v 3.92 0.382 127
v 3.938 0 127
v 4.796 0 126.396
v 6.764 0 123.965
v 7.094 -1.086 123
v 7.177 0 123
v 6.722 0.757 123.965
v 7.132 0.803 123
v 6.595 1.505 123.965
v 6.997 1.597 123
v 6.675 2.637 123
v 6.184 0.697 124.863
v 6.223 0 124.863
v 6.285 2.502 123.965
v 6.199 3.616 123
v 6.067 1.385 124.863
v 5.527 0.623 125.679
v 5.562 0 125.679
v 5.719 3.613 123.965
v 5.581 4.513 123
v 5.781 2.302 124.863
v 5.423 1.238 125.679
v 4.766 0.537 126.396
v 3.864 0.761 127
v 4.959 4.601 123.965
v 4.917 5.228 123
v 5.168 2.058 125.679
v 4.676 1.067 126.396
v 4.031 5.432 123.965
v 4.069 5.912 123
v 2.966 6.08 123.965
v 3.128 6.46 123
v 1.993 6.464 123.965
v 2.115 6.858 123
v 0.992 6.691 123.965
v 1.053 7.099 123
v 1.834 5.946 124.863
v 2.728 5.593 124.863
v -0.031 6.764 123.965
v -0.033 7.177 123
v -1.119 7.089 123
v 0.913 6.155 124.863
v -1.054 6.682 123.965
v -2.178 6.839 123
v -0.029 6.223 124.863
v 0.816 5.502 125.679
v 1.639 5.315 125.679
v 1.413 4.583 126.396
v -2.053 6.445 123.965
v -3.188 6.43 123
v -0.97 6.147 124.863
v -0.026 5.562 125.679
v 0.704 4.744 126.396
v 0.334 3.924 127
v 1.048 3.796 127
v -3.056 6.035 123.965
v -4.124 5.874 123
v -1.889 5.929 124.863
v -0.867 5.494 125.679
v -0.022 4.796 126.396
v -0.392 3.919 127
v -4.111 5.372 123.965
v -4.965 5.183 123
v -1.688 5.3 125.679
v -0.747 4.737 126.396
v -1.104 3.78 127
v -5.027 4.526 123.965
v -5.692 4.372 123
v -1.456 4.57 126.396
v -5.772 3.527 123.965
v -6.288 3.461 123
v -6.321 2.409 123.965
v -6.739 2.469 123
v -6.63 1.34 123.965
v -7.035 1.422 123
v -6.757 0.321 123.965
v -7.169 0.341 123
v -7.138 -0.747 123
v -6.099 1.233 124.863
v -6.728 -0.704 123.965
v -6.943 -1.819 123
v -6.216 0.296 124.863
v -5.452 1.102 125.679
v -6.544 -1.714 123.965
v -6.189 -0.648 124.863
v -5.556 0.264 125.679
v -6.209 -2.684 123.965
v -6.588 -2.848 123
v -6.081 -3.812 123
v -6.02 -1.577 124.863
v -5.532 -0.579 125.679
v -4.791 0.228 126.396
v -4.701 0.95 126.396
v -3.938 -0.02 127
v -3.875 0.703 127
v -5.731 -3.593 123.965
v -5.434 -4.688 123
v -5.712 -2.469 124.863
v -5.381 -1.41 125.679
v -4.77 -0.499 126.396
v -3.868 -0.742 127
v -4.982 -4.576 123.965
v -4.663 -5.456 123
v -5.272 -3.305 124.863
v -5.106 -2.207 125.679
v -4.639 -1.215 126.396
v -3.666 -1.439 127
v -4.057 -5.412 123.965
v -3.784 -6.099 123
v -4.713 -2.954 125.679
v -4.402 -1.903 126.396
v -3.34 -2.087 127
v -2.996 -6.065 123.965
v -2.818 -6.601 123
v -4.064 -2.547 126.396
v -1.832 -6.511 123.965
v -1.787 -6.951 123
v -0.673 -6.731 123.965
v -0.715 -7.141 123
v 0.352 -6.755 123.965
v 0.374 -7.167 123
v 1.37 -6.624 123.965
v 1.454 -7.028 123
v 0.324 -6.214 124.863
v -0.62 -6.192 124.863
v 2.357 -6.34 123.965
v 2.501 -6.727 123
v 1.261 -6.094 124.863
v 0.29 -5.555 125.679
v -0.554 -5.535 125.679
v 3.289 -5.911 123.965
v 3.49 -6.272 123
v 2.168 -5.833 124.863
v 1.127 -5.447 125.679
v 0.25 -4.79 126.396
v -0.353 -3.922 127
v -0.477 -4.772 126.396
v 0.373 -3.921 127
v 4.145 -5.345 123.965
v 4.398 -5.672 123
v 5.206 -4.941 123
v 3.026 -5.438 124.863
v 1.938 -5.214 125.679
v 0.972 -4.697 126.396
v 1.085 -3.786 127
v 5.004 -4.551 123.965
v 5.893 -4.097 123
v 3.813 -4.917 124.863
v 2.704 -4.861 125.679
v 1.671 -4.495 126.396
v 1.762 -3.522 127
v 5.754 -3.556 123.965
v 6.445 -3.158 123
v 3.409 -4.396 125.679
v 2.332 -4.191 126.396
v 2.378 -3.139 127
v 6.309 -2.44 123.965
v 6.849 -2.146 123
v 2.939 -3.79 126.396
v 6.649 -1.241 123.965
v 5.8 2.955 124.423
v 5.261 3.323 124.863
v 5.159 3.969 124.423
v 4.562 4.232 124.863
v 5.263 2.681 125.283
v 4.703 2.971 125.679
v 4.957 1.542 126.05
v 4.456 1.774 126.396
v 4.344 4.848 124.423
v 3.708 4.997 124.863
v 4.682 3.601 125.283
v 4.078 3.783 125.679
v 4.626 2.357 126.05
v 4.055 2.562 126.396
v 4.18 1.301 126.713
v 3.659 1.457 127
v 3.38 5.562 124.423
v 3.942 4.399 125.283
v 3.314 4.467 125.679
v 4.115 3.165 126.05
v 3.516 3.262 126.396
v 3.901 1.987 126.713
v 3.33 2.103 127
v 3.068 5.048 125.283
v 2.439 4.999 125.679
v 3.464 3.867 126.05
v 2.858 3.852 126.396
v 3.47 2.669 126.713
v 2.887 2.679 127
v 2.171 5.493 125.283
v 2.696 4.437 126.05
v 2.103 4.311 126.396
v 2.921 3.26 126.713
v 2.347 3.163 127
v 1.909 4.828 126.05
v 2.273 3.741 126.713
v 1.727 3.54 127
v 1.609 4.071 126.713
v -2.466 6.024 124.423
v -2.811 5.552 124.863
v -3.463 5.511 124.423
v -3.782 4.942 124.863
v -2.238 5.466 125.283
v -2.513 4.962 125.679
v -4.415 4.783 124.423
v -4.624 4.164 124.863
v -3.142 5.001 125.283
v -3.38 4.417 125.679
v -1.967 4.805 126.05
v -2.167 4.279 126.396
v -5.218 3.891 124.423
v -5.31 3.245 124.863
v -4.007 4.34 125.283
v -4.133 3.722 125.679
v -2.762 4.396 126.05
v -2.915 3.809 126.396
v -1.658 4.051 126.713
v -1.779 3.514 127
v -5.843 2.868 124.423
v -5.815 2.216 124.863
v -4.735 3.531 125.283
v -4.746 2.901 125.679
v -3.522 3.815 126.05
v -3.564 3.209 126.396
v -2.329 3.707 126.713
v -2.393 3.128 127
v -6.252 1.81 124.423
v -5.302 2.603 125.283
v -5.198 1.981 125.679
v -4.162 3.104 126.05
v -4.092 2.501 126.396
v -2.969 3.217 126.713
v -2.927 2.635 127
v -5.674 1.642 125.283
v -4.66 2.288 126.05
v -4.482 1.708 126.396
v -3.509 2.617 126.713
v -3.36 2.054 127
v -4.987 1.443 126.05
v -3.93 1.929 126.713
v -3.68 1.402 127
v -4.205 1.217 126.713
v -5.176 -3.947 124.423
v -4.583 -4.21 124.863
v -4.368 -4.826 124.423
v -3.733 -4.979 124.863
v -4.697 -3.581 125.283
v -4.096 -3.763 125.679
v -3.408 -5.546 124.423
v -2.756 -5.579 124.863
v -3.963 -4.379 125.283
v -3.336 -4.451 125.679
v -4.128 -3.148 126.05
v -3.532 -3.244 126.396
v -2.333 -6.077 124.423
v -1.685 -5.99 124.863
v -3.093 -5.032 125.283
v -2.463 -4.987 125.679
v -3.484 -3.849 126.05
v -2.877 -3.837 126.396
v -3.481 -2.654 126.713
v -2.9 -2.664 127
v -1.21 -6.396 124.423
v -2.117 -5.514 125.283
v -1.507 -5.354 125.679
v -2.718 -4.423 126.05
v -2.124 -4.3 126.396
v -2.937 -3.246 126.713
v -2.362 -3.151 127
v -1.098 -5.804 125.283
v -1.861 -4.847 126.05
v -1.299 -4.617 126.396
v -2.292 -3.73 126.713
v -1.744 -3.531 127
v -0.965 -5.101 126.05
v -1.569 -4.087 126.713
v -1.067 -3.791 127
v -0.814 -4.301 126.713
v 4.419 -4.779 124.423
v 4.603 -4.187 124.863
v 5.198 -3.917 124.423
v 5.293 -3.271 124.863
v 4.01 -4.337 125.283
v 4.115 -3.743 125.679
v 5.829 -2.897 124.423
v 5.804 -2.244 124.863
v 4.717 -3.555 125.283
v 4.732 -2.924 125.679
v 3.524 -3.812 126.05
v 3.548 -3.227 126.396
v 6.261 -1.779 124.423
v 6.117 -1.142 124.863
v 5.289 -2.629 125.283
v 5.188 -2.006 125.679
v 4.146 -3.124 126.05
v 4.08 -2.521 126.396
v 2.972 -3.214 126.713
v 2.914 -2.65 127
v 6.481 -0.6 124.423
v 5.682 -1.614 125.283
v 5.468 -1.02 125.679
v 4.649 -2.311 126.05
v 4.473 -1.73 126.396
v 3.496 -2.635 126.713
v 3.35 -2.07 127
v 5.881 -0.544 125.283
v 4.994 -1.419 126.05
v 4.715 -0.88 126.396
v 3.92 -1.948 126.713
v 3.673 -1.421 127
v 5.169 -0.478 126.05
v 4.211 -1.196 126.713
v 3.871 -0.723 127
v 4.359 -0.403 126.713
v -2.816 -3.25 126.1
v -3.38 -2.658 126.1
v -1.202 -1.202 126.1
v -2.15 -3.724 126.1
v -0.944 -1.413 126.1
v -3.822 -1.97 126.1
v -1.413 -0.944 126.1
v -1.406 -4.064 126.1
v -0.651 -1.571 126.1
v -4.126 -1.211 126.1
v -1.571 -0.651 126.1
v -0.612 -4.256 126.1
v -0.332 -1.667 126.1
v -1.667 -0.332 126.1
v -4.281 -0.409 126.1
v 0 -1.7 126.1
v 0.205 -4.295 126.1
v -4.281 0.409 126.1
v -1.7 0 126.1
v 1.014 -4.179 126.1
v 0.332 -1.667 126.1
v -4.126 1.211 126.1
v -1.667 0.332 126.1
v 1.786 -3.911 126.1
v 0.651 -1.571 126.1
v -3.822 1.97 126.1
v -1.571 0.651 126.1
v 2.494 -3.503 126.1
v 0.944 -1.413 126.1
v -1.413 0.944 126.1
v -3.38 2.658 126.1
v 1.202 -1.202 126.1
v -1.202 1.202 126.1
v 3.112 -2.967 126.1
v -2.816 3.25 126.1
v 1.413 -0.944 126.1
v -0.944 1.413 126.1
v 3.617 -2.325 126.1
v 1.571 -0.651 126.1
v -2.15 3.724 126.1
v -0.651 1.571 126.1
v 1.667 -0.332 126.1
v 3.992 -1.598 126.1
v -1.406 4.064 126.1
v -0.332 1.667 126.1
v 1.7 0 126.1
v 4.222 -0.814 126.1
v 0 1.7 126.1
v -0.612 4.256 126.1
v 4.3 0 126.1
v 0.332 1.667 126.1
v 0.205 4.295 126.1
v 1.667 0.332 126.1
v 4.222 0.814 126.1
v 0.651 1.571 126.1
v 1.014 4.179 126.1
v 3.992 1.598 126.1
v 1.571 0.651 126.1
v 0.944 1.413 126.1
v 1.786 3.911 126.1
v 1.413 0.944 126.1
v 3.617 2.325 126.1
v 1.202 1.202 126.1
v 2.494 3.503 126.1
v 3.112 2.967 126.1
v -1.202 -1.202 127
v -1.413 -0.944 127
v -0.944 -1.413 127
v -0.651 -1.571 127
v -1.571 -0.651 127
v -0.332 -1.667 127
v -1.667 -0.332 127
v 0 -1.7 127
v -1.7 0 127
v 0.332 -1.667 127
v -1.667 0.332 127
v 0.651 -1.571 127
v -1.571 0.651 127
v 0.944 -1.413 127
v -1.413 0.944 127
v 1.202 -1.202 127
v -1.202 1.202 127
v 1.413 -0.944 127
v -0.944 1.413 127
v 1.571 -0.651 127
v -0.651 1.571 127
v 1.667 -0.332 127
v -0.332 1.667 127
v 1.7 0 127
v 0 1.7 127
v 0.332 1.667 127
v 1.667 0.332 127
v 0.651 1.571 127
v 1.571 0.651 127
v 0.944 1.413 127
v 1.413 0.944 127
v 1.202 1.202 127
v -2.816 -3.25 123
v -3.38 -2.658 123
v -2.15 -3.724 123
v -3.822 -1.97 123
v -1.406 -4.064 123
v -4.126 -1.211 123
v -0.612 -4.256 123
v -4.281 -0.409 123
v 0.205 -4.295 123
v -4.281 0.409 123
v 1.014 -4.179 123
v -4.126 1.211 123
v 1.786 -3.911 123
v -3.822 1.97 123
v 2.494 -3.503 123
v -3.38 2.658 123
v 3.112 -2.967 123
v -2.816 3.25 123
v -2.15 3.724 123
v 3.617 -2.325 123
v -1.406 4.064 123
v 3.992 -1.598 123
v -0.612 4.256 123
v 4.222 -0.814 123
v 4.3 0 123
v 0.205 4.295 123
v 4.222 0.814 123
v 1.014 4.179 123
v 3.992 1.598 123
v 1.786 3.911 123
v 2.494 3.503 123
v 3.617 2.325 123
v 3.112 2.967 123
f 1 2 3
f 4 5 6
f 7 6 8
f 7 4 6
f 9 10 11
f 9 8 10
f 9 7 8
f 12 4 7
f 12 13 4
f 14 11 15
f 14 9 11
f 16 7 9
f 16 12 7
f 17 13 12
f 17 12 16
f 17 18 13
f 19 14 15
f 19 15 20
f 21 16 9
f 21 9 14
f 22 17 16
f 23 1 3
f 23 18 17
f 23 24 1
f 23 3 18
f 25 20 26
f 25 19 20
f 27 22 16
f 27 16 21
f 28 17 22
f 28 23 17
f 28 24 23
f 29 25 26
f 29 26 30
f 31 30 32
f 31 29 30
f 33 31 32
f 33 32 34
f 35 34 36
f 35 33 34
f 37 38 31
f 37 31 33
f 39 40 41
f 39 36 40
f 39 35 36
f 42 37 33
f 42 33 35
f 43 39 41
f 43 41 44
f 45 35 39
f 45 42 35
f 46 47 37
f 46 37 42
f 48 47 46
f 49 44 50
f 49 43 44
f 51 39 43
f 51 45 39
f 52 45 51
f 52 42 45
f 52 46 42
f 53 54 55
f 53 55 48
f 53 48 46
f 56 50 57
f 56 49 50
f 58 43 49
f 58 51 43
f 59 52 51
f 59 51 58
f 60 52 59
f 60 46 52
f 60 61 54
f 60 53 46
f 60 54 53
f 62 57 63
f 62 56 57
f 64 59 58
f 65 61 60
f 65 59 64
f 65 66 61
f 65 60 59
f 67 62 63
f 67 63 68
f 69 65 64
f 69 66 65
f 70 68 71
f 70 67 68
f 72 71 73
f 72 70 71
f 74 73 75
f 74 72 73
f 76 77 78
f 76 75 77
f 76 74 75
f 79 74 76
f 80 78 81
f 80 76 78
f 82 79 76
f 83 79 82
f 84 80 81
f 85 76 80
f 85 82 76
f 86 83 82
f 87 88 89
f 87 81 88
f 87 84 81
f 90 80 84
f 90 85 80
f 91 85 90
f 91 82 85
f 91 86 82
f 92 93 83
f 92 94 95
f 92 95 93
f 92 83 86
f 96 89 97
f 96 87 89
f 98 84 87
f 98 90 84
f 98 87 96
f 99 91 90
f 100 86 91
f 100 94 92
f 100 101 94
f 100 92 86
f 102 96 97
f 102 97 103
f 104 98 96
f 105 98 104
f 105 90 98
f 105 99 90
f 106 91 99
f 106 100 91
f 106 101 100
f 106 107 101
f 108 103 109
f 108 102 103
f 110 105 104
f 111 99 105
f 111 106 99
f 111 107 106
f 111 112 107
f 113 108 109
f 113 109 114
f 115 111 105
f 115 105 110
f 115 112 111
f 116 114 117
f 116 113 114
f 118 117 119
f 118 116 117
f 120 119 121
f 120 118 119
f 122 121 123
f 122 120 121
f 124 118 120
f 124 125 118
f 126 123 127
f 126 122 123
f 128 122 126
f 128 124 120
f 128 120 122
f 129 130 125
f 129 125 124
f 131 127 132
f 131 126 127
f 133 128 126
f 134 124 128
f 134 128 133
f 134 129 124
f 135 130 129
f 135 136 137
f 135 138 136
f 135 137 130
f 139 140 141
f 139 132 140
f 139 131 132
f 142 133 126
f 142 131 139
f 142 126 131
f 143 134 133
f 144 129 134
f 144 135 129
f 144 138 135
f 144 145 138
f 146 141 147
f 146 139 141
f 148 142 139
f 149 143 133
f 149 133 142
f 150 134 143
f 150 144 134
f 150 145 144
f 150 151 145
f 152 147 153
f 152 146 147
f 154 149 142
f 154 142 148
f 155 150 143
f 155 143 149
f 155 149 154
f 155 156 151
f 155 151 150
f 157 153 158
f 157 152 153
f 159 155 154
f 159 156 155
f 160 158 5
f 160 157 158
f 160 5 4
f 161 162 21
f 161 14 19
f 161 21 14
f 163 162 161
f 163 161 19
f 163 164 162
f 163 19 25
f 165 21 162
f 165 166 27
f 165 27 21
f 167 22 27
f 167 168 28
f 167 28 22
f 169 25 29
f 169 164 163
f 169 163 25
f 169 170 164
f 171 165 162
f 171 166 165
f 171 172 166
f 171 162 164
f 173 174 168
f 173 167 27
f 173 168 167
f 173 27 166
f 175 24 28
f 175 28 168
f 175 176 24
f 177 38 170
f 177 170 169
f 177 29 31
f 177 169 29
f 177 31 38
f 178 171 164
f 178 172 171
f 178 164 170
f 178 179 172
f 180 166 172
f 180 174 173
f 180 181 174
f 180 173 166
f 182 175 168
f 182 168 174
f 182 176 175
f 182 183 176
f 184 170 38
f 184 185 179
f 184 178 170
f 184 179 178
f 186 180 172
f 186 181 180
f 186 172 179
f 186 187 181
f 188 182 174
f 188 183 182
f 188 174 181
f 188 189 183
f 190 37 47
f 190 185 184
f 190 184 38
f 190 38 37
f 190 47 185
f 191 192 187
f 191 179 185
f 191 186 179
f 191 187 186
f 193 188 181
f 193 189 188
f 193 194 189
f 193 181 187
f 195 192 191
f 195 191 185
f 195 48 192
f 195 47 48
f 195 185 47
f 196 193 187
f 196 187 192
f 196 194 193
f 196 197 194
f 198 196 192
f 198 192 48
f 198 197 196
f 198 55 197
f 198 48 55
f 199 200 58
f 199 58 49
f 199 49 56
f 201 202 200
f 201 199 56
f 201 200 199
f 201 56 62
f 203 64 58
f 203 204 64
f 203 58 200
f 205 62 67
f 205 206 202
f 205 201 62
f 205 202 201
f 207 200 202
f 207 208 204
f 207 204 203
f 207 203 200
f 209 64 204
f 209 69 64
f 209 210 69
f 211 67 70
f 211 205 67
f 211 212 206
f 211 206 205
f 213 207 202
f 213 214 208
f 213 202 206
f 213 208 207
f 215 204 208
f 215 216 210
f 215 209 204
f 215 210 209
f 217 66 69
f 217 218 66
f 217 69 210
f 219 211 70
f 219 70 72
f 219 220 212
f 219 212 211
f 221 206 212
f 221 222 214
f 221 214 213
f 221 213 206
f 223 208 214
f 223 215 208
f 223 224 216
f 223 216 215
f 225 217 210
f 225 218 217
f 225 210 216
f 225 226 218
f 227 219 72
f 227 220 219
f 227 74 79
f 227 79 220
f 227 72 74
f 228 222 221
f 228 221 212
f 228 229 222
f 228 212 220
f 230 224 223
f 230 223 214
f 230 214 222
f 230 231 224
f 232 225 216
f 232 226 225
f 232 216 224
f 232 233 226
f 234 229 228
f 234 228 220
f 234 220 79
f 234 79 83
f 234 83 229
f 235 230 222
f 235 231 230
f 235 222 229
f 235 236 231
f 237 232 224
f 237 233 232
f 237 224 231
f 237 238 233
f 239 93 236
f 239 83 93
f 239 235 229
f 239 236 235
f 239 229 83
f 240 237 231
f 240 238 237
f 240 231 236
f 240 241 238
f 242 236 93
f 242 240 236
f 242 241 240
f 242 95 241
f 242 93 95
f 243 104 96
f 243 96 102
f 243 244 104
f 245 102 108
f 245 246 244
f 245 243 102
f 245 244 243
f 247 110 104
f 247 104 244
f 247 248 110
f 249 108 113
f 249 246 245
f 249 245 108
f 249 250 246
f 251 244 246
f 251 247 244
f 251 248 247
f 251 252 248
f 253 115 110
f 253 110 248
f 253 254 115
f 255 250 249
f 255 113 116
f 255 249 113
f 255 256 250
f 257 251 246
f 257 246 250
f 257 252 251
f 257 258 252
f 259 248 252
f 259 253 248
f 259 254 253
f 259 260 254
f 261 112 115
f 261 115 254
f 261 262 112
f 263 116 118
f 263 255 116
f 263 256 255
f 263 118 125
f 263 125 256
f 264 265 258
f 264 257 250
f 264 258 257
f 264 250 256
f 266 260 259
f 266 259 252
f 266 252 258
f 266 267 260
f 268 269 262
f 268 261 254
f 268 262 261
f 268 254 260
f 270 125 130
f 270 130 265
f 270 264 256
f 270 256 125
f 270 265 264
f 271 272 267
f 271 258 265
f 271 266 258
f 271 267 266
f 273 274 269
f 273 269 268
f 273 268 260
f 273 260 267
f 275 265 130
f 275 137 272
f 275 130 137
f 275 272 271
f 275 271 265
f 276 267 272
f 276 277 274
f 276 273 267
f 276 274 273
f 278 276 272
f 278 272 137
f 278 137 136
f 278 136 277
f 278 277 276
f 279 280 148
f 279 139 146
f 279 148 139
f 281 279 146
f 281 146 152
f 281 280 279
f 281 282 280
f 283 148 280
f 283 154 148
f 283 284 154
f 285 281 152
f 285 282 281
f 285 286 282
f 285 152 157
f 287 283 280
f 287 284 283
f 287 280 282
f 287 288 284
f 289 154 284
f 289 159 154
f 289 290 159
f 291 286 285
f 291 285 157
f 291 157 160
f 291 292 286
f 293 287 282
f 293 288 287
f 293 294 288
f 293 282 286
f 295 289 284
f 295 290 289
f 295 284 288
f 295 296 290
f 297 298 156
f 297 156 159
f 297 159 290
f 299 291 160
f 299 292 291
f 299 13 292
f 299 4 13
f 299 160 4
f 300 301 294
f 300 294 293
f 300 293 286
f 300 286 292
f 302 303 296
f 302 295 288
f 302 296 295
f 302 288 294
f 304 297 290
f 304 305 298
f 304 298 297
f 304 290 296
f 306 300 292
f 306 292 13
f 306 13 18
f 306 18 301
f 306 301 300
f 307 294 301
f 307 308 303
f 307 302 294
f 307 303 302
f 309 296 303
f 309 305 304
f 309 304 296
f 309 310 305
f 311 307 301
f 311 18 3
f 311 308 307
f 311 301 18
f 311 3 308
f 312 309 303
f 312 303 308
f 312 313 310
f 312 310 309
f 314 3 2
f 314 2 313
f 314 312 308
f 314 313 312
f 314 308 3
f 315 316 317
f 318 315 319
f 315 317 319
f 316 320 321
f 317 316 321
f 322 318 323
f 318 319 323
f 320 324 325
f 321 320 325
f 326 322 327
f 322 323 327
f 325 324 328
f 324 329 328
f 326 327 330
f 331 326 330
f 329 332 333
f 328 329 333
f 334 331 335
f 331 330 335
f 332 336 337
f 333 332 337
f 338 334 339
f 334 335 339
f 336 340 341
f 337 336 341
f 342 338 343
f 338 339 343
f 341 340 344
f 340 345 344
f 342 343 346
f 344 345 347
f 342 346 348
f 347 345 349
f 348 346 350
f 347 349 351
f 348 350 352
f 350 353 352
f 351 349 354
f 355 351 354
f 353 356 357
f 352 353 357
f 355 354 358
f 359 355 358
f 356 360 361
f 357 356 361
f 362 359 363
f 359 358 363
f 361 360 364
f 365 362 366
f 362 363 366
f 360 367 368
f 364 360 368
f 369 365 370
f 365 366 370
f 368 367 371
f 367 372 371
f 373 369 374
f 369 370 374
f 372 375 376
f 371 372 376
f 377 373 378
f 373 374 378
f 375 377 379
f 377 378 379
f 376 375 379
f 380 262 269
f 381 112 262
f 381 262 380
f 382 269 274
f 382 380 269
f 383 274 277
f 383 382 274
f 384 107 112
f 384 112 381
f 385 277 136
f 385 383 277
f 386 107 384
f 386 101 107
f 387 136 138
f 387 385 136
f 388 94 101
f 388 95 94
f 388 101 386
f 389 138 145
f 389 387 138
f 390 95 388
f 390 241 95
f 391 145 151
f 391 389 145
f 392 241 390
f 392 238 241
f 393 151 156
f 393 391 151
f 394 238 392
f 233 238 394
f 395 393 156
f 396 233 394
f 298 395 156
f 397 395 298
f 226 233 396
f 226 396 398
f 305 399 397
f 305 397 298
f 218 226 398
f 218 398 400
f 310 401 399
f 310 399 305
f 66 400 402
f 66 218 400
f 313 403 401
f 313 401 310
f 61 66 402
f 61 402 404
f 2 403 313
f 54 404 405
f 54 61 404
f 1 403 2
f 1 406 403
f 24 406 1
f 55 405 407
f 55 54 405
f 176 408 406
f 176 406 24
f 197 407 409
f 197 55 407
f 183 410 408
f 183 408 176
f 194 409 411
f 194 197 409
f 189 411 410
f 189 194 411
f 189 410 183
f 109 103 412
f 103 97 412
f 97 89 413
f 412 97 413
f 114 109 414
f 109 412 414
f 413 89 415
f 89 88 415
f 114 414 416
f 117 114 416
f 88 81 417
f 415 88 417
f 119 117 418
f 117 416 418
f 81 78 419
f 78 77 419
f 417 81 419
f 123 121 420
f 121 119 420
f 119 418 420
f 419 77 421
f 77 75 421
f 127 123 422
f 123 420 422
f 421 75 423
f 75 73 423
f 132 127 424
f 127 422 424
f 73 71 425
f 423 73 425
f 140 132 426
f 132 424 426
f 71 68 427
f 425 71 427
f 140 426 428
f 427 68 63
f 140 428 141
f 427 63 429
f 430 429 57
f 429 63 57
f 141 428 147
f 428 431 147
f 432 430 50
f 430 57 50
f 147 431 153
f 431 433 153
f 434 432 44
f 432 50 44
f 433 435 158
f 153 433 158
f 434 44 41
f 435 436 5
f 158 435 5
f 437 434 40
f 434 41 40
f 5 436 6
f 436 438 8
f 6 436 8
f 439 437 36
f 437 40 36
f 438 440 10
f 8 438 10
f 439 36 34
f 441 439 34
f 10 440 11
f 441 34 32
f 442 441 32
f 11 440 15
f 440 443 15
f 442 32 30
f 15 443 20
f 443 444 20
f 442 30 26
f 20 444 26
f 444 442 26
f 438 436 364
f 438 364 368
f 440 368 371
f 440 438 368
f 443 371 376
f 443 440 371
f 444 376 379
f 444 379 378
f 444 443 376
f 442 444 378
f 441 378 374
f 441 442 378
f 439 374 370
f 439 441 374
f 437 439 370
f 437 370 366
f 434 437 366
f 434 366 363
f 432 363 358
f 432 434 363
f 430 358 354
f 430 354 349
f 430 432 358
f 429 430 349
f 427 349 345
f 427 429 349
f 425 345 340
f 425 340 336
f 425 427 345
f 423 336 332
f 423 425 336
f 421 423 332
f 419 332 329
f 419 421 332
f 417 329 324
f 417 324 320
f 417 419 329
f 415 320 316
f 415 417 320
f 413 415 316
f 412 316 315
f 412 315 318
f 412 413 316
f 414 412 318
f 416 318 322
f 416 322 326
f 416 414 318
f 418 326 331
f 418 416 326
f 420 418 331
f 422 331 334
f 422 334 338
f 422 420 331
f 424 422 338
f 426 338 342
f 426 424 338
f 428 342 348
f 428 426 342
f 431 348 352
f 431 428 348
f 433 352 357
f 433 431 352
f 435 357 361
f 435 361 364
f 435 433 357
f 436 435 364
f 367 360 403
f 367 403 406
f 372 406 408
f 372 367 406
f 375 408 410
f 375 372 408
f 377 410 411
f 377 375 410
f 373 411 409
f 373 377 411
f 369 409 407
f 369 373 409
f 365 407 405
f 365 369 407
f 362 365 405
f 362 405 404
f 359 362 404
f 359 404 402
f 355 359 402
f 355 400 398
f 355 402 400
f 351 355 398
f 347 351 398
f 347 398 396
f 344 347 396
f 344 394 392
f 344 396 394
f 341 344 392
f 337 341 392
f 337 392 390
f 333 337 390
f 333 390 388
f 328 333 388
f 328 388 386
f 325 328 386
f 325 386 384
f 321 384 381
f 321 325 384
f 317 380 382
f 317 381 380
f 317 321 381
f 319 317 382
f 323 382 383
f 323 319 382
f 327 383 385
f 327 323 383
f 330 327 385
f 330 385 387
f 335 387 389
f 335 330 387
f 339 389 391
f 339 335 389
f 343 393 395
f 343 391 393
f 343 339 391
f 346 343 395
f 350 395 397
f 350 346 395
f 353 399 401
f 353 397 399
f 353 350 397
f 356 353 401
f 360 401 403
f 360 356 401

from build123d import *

# Parameters (mm, degrees)
CYLINDER046_R     = 4.3
CYLINDER046_DEPTH = 3.1
CYLINDER010_R     = 1.7
CYLINDER010_DEPTH = 10
CYLINDER045_R     = 9
CYLINDER045_DEPTH = 4


with BuildPart() as cylinder046:
    # Cylinder046 → Cylinder046 (new body)
    with BuildSketch(Plane.XY.offset(123)):
        Circle(CYLINDER046_R)
    extrude(amount=CYLINDER046_DEPTH)


with BuildPart() as uitsparing:
    # Cylinder010 → Cylinder010 (new body)
    with BuildSketch(Plane.XY.offset(118)):
        Circle(CYLINDER010_R)
    extrude(amount=CYLINDER010_DEPTH)

    # Fusion006: union Cylinder046
    add(cylinder046.part)


with BuildPart() as sphere:
    # Sphere → Sphere (revolve)
    with BuildSketch(Plane(origin=(0, 0, 120.5), x_dir=(1, 0, 0), z_dir=(0, -1, 0))):
        with BuildLine():
            ThreePointArc((7.185941, 2.474318), (4.413342, 6.187278), (0, 7.6))
            Line((0, 7.6), (0, 2.474318))
            Line((0, 2.474318), (7.185941, 2.474318))
        make_face()
    revolve(axis=Axis((0, 0, 120.5), (0, 0, 1)))


with BuildPart() as top:
    # Cylinder045 → Cylinder045 (new body)
    with BuildSketch(Plane.XY.offset(123)):
        Circle(CYLINDER045_R)
    extrude(amount=CYLINDER045_DEPTH)

    # Common002: intersect Sphere
    add(sphere.part, mode=Mode.INTERSECT)

    # Cut039: cut uitsparing
    add(uitsparing.part, mode=Mode.SUBTRACT)


solid = top.part
